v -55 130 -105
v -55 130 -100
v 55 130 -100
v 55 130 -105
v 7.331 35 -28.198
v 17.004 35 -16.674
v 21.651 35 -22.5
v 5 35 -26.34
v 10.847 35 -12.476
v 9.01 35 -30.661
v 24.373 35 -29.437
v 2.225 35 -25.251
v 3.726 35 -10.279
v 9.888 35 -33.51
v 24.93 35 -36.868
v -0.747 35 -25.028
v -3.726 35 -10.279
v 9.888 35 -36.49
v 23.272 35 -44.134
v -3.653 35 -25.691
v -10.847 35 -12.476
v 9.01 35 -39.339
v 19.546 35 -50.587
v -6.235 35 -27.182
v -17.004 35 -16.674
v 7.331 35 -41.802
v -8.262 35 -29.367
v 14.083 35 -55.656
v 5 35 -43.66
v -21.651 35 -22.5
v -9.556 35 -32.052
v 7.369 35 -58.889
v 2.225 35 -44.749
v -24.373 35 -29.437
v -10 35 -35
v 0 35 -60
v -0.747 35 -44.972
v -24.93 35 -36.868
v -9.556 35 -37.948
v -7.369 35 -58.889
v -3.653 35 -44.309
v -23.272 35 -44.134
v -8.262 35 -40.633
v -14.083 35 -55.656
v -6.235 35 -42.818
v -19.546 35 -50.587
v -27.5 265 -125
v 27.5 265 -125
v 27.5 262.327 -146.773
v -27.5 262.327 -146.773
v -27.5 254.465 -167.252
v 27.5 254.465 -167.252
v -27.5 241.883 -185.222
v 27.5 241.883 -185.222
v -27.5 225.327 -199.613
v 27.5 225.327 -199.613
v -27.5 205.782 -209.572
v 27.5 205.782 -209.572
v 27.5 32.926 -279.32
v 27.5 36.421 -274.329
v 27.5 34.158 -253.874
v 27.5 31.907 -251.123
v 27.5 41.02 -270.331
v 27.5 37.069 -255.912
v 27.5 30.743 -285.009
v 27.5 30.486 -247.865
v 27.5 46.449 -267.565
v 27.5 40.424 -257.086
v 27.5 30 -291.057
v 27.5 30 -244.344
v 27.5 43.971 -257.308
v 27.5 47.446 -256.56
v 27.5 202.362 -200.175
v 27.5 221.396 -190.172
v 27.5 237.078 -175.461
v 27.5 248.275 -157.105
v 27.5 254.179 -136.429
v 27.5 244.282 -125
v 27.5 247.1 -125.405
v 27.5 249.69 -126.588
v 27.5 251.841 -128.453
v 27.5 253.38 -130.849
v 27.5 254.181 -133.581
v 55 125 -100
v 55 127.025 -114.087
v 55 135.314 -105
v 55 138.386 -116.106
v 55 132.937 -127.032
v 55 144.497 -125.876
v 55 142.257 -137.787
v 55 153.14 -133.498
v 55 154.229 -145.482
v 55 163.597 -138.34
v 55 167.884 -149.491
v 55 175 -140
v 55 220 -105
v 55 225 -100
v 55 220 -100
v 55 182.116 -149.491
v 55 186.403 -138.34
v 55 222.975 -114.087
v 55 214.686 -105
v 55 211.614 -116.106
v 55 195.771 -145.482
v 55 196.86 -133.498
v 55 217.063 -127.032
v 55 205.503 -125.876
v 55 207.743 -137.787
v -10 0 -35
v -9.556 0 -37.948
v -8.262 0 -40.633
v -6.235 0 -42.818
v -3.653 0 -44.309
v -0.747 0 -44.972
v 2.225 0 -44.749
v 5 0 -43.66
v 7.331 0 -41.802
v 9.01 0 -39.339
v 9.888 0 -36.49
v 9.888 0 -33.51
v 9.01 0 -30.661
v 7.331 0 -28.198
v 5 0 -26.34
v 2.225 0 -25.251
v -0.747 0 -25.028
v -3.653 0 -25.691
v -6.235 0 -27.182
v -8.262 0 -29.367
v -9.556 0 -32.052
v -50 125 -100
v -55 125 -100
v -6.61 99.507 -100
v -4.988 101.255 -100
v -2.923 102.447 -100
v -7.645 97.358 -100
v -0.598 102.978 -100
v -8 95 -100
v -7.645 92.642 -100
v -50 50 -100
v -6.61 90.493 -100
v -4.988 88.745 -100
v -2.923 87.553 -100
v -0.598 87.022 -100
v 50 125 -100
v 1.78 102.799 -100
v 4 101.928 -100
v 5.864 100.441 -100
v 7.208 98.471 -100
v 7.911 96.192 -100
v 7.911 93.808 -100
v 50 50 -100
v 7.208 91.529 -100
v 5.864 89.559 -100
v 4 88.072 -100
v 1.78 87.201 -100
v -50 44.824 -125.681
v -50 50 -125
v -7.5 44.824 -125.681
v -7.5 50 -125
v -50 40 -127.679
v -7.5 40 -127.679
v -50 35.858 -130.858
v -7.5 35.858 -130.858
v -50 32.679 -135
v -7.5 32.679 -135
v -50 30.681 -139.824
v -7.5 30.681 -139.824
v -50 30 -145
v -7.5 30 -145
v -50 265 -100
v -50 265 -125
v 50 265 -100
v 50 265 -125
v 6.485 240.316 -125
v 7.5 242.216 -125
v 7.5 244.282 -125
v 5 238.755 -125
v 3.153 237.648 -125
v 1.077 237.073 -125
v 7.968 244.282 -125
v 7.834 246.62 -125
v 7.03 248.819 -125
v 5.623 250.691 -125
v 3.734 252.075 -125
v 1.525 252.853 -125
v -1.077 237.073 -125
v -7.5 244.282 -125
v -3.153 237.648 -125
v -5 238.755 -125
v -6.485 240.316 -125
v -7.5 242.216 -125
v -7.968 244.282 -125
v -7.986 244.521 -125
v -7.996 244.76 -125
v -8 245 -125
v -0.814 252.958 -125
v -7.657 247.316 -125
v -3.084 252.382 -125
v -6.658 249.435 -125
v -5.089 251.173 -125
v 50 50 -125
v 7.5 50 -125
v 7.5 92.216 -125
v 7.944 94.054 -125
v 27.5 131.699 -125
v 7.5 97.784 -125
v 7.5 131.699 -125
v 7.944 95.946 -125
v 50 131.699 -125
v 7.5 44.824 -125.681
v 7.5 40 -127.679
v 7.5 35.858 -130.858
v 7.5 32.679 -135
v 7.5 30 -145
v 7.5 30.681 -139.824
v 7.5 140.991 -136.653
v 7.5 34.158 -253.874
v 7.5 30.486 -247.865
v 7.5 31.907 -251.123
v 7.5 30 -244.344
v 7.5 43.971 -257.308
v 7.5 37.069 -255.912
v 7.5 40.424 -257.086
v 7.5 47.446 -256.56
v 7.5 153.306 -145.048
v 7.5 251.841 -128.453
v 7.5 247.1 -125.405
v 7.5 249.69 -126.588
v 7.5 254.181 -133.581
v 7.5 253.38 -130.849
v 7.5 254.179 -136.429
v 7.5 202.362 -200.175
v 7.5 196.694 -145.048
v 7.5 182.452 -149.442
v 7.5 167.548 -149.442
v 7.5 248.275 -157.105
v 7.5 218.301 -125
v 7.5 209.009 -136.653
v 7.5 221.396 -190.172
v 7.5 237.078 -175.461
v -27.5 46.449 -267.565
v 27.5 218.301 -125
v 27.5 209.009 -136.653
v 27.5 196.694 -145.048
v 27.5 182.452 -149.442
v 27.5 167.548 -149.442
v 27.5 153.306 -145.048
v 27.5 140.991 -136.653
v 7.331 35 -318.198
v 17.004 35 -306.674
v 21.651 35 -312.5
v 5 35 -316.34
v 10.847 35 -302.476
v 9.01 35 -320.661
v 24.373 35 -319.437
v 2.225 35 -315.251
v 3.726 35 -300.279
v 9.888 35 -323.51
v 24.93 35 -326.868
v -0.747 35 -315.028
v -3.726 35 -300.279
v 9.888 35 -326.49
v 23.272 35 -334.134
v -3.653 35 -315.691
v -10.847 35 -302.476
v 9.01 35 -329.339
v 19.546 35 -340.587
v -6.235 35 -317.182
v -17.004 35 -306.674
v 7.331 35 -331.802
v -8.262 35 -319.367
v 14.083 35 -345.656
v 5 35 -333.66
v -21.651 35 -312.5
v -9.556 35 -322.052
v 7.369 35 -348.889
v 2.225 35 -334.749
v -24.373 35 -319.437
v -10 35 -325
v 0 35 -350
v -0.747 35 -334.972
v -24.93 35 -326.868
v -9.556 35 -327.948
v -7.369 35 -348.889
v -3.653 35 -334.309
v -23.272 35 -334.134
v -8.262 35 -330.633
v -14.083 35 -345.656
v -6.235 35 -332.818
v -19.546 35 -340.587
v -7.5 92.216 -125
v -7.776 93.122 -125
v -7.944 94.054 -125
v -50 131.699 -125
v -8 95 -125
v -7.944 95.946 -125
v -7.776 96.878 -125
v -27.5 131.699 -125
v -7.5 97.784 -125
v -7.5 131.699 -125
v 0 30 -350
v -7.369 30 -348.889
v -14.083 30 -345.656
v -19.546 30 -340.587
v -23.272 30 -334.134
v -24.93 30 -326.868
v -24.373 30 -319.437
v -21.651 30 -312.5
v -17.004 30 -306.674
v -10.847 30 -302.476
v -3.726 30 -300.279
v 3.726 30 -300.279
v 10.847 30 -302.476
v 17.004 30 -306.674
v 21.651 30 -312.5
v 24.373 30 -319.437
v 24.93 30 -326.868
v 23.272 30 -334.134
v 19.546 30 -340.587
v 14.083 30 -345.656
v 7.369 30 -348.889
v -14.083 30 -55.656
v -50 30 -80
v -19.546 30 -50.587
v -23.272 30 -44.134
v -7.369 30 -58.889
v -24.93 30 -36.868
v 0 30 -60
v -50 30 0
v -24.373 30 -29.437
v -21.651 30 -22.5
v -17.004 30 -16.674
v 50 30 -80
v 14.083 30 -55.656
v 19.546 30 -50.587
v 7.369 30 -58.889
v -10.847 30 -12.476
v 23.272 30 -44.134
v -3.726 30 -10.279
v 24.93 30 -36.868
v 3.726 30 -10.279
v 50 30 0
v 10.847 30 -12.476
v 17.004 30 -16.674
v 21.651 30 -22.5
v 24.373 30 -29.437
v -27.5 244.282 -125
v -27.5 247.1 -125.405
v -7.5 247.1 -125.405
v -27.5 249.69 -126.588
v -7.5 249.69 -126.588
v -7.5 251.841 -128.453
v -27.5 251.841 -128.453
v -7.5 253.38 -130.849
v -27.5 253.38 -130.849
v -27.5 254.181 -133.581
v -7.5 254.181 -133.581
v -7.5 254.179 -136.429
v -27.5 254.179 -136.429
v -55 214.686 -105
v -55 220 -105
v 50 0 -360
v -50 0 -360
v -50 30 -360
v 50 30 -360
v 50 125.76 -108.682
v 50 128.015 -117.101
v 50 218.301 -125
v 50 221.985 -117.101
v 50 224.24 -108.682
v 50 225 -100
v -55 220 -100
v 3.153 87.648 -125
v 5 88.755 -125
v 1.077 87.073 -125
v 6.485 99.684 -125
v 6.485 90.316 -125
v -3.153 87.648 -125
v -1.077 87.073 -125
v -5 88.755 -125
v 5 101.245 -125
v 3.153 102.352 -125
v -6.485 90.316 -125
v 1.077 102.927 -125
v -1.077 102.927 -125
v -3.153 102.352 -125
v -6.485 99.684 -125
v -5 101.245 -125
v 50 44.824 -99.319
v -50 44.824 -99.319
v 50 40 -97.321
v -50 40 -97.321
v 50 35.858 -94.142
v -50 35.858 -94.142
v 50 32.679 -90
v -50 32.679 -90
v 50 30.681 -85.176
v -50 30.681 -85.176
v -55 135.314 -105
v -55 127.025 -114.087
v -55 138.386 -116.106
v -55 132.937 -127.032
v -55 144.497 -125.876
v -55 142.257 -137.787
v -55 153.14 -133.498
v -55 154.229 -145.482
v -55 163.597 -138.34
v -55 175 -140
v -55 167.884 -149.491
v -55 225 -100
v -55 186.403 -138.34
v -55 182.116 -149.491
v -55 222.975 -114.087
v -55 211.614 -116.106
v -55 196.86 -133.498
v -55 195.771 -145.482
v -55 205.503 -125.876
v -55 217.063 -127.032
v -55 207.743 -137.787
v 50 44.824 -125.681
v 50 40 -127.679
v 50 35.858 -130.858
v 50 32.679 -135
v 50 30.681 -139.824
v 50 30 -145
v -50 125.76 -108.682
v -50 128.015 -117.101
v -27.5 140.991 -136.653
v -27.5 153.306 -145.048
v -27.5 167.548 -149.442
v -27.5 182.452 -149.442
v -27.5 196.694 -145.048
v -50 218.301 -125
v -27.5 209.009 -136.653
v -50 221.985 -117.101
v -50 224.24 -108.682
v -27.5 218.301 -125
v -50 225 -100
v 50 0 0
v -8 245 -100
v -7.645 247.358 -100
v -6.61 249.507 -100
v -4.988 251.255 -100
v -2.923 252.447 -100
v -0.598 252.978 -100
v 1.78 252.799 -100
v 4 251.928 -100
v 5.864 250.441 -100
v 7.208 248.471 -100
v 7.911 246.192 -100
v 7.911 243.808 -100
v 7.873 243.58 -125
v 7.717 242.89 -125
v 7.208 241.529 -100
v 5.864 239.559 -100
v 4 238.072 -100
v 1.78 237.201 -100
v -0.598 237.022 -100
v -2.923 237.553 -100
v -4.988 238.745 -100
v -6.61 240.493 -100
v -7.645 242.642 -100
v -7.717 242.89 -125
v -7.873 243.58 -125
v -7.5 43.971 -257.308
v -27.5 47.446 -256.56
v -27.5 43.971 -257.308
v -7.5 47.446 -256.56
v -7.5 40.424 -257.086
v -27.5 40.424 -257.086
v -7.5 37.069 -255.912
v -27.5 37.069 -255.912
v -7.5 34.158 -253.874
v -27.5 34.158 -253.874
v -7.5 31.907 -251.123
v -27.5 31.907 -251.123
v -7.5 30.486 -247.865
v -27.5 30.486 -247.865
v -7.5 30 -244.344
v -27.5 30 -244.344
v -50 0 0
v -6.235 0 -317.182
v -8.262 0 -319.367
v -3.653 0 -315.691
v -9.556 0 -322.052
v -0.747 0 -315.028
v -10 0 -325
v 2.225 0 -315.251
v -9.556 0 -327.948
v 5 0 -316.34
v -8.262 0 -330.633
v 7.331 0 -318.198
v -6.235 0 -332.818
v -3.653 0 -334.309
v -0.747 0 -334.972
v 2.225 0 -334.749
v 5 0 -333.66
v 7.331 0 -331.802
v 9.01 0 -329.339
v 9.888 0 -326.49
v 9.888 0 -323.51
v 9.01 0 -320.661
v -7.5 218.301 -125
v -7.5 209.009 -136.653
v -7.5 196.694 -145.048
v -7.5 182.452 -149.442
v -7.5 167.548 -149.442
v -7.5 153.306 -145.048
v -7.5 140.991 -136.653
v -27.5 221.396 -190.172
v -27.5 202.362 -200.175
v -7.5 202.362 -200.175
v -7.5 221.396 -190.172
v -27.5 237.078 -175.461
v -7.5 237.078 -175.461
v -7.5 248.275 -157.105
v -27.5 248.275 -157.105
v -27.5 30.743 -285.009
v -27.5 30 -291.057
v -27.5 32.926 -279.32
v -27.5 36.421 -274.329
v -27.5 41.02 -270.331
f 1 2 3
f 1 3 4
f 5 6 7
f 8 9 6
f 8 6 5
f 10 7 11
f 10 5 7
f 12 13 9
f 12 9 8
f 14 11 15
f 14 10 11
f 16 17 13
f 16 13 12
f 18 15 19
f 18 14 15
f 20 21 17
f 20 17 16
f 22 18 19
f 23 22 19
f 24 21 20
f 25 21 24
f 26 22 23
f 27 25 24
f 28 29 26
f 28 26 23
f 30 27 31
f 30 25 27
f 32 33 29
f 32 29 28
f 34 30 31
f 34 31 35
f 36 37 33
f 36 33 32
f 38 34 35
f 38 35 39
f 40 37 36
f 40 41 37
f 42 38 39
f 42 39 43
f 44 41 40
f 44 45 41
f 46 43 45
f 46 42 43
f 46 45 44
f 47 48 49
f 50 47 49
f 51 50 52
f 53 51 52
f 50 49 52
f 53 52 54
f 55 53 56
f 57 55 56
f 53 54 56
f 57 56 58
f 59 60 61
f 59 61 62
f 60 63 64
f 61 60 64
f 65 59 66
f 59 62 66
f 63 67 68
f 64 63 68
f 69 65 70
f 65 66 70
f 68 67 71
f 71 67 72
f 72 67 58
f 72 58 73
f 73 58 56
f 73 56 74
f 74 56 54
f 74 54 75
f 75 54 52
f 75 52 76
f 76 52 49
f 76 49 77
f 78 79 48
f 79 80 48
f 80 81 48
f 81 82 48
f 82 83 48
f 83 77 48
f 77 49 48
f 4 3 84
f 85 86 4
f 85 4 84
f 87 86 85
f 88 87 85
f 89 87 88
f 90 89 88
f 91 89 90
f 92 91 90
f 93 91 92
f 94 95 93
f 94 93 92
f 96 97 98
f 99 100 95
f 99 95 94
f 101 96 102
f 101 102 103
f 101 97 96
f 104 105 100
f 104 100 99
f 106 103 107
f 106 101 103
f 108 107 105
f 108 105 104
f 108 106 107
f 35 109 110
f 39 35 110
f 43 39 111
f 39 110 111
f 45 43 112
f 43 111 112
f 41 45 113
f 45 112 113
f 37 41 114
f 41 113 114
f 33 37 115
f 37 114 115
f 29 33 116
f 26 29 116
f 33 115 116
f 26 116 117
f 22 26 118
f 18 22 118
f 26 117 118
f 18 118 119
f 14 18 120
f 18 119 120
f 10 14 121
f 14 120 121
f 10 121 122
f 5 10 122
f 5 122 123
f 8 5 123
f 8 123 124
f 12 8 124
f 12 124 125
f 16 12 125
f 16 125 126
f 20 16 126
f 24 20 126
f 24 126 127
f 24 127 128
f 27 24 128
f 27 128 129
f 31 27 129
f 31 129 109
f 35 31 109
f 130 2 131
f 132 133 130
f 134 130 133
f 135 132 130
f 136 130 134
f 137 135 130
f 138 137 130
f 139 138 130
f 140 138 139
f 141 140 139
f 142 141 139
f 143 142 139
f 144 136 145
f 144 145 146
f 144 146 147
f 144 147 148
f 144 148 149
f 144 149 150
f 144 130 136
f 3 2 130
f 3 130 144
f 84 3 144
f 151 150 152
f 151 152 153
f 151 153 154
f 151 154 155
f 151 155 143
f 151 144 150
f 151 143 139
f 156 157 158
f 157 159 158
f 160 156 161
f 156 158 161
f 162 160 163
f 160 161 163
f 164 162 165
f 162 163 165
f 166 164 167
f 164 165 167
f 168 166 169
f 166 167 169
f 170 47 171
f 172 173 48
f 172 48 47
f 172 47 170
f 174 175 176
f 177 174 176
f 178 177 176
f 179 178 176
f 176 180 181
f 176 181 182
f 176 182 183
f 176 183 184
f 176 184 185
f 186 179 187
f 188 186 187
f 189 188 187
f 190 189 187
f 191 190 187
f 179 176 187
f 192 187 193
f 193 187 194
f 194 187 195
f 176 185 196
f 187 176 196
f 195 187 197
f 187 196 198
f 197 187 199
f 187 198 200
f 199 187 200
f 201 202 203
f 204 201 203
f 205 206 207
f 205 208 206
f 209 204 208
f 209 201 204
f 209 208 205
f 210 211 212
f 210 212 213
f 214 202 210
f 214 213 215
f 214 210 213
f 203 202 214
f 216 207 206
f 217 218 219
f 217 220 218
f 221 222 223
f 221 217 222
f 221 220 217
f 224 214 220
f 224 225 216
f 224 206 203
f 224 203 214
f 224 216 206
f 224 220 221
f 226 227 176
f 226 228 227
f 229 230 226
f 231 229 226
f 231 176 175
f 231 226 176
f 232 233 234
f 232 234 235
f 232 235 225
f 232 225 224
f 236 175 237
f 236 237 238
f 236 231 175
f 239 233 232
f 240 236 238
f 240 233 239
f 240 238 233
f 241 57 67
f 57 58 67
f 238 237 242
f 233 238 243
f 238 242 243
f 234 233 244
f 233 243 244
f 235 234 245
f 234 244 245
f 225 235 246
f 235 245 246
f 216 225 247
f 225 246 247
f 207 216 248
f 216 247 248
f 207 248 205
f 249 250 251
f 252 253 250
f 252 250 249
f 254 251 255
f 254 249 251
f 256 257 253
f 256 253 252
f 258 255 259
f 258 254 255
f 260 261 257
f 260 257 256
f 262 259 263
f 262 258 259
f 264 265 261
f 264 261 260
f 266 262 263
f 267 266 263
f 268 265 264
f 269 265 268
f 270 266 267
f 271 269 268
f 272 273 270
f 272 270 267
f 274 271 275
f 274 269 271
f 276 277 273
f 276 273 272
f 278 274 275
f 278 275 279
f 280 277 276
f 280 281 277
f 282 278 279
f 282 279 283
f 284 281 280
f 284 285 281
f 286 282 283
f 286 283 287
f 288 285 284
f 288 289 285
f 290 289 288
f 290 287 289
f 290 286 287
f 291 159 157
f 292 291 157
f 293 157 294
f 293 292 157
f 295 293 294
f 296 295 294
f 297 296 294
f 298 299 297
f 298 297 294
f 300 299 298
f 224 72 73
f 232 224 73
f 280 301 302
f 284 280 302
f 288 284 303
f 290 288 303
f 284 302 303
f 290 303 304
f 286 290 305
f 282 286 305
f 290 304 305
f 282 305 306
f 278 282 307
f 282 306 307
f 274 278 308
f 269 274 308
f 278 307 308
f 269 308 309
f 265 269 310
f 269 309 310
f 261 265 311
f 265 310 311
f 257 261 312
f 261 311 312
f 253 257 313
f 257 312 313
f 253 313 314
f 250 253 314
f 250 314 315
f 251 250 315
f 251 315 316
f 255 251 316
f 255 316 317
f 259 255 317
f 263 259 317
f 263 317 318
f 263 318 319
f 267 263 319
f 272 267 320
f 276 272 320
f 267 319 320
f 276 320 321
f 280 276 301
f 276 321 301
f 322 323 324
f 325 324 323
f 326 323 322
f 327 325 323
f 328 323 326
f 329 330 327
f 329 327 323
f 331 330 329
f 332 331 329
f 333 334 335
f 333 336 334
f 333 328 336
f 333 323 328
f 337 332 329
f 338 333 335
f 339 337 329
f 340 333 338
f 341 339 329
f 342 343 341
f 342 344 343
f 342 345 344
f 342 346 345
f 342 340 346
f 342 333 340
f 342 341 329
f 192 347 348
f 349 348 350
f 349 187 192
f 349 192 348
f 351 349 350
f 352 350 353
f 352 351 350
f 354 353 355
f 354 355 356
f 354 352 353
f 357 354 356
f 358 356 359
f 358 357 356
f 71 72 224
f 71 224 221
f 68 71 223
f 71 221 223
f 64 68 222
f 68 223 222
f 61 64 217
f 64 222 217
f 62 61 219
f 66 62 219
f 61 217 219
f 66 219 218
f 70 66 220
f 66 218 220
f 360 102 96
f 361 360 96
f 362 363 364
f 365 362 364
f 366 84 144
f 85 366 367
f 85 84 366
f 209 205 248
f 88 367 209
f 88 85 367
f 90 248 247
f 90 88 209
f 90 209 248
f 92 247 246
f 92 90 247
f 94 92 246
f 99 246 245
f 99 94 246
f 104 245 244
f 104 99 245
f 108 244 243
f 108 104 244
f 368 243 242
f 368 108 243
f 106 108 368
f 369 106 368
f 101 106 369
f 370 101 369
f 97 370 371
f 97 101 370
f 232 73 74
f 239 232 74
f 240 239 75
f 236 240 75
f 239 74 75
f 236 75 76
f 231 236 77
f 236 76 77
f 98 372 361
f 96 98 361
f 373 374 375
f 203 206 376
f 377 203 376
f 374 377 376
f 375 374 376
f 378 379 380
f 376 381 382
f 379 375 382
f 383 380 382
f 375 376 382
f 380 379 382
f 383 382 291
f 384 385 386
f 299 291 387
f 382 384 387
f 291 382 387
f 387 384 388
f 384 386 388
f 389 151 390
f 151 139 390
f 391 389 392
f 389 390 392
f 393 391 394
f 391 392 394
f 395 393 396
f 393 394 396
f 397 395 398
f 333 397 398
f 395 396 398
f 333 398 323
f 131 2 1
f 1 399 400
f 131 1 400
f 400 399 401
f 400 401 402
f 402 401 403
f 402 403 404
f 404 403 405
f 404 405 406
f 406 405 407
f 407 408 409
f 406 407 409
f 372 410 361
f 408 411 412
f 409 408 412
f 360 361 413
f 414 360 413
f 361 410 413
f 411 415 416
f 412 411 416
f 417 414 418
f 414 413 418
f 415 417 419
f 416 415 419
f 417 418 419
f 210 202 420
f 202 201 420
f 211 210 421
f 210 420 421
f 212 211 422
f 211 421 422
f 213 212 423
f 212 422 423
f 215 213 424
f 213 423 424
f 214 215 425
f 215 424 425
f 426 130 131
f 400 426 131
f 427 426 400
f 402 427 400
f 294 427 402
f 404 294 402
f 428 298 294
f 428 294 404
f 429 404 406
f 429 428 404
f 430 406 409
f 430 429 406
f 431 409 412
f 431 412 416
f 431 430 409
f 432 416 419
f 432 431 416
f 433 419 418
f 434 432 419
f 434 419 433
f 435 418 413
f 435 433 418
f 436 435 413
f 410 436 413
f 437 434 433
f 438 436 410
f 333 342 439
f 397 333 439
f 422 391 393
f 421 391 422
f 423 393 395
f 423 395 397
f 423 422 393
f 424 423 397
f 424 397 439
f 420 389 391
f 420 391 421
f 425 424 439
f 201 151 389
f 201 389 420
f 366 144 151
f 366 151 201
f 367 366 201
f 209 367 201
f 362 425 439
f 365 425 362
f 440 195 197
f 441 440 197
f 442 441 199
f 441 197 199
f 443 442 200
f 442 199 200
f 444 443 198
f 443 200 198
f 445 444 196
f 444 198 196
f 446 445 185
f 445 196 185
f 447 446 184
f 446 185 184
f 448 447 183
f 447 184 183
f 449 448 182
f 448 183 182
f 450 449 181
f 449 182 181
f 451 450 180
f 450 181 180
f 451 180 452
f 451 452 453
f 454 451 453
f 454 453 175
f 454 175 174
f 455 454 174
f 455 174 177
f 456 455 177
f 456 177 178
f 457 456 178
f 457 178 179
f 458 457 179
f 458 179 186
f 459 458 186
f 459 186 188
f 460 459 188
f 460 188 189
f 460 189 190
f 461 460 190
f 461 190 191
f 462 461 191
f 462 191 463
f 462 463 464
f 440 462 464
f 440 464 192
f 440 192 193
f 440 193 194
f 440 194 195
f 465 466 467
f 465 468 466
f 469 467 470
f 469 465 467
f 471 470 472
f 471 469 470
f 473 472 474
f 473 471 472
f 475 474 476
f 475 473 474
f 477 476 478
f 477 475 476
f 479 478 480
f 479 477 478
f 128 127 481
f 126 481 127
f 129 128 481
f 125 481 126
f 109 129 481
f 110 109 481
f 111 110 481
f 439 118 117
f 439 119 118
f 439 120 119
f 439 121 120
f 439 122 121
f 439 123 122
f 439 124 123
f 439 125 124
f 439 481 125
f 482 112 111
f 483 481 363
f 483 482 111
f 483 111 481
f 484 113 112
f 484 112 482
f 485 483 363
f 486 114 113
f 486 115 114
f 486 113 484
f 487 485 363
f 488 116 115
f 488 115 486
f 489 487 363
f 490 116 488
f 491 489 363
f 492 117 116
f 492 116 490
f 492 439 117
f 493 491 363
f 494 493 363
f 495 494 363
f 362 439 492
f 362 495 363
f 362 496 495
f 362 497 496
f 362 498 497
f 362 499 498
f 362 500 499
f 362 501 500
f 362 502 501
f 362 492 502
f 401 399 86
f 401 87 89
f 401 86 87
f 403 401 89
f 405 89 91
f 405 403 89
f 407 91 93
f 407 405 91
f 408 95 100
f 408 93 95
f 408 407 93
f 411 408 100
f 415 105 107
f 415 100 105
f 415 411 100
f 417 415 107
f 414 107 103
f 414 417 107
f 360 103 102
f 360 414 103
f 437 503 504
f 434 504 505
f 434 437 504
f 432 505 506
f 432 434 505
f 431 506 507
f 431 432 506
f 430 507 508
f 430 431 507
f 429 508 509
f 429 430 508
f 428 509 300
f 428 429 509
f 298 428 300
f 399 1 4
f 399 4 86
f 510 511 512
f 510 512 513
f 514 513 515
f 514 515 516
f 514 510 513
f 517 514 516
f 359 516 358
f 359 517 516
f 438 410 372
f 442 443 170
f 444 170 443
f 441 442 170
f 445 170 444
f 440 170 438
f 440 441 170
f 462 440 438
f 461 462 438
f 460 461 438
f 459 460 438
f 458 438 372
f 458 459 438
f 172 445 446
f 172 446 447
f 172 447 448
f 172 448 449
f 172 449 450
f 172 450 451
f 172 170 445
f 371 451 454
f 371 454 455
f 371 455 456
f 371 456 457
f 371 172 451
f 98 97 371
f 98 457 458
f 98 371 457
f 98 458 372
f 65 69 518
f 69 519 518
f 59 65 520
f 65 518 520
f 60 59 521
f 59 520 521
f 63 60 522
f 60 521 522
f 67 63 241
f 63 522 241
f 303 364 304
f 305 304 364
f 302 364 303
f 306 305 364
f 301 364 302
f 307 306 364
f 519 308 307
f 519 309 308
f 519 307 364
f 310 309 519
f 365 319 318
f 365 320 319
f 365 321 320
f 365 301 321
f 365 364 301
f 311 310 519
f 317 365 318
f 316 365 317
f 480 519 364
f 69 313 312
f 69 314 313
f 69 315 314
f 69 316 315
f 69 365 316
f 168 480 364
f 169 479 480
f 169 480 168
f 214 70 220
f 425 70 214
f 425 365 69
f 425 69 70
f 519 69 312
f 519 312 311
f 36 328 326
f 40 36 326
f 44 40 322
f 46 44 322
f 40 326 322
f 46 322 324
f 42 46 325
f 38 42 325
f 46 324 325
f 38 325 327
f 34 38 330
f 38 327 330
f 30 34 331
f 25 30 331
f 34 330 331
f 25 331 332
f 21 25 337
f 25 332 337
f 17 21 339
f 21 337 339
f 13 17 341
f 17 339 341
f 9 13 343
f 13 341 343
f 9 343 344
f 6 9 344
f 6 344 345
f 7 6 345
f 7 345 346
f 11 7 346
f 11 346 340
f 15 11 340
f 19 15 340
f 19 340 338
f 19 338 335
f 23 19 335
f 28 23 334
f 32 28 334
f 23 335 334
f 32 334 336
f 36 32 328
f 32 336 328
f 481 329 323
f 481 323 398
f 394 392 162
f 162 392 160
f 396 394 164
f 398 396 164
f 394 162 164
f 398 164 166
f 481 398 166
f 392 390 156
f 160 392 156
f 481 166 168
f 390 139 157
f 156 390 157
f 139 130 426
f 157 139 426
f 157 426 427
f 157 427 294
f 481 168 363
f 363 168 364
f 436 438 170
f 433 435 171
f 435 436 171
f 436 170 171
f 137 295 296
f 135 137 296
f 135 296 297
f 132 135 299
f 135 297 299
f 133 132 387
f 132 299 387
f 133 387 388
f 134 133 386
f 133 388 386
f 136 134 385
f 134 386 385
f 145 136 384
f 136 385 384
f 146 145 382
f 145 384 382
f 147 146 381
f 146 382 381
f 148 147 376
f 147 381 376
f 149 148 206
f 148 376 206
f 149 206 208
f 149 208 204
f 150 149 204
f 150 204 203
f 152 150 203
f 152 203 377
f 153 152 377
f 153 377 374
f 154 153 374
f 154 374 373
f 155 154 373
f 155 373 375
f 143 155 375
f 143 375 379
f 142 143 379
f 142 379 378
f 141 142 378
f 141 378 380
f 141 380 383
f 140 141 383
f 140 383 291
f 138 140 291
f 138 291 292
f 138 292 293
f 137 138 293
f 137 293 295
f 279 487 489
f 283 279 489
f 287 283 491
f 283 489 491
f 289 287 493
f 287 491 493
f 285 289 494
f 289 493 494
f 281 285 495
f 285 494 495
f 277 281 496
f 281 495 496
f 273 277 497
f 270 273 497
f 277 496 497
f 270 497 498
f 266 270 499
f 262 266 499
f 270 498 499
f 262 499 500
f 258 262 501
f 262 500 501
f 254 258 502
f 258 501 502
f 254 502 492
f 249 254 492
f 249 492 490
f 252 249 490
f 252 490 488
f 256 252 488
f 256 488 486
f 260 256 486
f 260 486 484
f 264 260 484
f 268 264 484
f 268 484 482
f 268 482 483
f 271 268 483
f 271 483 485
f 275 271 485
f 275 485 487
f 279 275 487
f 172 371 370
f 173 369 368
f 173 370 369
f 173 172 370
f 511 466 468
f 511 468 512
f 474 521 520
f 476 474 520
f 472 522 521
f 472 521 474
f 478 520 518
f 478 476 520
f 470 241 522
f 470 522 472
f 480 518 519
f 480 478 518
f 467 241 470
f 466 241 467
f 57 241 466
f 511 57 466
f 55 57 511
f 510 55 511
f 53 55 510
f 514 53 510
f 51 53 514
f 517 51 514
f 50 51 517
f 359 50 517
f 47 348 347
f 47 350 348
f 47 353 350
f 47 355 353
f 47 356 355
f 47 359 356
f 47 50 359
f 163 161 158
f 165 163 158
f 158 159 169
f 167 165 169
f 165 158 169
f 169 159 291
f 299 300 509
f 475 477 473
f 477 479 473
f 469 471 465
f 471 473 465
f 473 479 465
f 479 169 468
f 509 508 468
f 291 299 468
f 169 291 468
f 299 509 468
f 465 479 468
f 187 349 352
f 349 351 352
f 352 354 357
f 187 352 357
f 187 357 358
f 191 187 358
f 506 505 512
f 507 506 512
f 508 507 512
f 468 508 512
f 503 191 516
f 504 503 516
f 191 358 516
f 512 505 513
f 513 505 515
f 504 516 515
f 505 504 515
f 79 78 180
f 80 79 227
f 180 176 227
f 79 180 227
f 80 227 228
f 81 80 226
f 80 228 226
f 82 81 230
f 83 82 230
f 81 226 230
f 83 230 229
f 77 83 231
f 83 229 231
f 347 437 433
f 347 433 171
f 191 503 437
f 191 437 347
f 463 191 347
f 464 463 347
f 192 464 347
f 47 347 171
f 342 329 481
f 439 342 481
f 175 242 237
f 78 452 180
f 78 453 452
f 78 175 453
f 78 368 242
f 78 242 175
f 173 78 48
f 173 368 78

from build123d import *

# Parameters (mm, degrees)
BOSS_EXTRUDE1_DEPTH     = 50
BOSS_EXTRUDE4_DEPTH     = 55
BOSS_EXTRUDE5_DEPTH     = 27.5
CUT_EXTRUDE1_DEPTH      = 20
FILLET1_R               = 13
FILLET2_R               = 25
FILLET3_R               = 10
FILLET4_R               = 20
CUT_EXTRUDE2_DEPTH      = 461.353125329
CUT_EXTRUDE2_DEPTH_BACK = 461.353125329
CUT_EXTRUDE3_START      = -110
SKETCH14_W              = 10
SKETCH14_H              = 90
CUT_EXTRUDE3_DEPTH      = 110
SKETCH15_R              = 25
BOSS_EXTRUDE6_DEPTH     = 5
LPATTERN1_COUNT         = 2
LPATTERN1_PITCH         = 290
HOLE1_D                 = 20
HOLE2_D                 = 16
HOLE2_DEPTH             = 25
LPATTERN2_COUNT         = 2
LPATTERN2_PITCH         = 150


with BuildPart() as part:
    # Sketch2 → Boss-Extrude1 (new, symmetric)
    with BuildSketch(Plane(origin=(0, 0, 0), x_dir=(0, 0, -1), z_dir=(1, 0, 0))):
        Polygon((0, 0), (360, 0), (360, 30), (125, 30), (125, 265), (100, 265), (100, 30), (0, 30), align=None)
    extrude(amount=BOSS_EXTRUDE1_DEPTH, both=True)

    # Sketch7 → Boss-Extrude4 (add, symmetric)
    with BuildSketch(Plane(origin=(0, 0, 0), x_dir=(0, 0, -1), z_dir=(1, 0, 0))):
        with BuildLine():
            Line((100, 225), (100, 125))
            ThreePointArc((100, 125), (150, 175), (100, 225))
        make_face()
    extrude(amount=BOSS_EXTRUDE4_DEPTH, both=True)

    # Sketch11 → Boss-Extrude5 (add, symmetric)
    with BuildSketch(Plane(origin=(0, 0, 0), x_dir=(0, 0, -1), z_dir=(1, 0, 0))):
        with BuildLine():
            Line((209.572335871, 205.781812899), (273.551683491, 30))
            Line((273.551683491, 30), (125, 30))
            Line((125, 30), (125, 265))
            ThreePointArc((125, 265), (176.621879272, 248.723683986), (209.572335871, 205.781812899))
        make_face()
    extrude(amount=BOSS_EXTRUDE5_DEPTH, both=True)

    # Sketch12 → Cut-Extrude1 (cut)
    with BuildSketch(Plane(origin=(27.5, 0, 0), x_dir=(0, 0, -1), z_dir=(1, 0, 0))):
        with BuildLine():
            Line((125, 255), (125, 218.301270189))
            ThreePointArc((125, 218.301270189), (150, 175), (125, 131.698729811))
            Line((125, 131.698729811), (125, 30))
            Line((125, 30), (262.909905767, 30))
            Line((262.909905767, 30), (200.175409663, 202.361611466))
            ThreePointArc((200.175409663, 202.361611466), (170.886114908, 240.532163543), (125, 255))
        make_face()
    cut_extrude1 = extrude(amount=-CUT_EXTRUDE1_DEPTH, mode=Mode.SUBTRACT)

    # Mirror1: Cut-Extrude1 across plane
    add(cut_extrude1.mirror(Plane(origin=(0, 0, 0), x_dir=(0, 0, 1), z_dir=(1, 0, 0))), mode=Mode.SUBTRACT)

    # Fillet1
    fillet1_edges = [part.edges().sort_by_distance(p)[0] for p in [
        (17.5, 30, -262.909905767),
        (-17.5, 30, -262.909905767),
    ]]
    fillet(fillet1_edges, radius=FILLET1_R)

    # Fillet2
    fillet2_edges = [part.edges().sort_by_distance(p)[0] for p in [
        (0, 30, -273.551683491),
    ]]
    fillet(fillet2_edges, radius=FILLET2_R)

    # Fillet3
    fillet3_edges = [part.edges().sort_by_distance(p)[0] for p in [
        (17.5, 255, -125),
        (-17.5, 255, -125),
    ]]
    fillet(fillet3_edges, radius=FILLET3_R)

    # Fillet4
    fillet4_edges = [part.edges().sort_by_distance(p)[0] for p in [
        (0, 30, -100),
        (28.75, 30, -125),
        (-28.75, 30, -125),
    ]]
    fillet(fillet4_edges, radius=FILLET4_R)

    # Sketch13 → Cut-Extrude2 (cut, two sides: drawn at the far end of the back side and taken through both)
    with BuildSketch(Plane(origin=(55, 0, 0), x_dir=(0, 0, -1), z_dir=(1, 0, 0)).offset(-CUT_EXTRUDE2_DEPTH_BACK)):
        with BuildLine():
            Line((100, 215), (100, 135))
            ThreePointArc((100, 135), (140, 175), (100, 215))
        make_face()
    extrude(amount=CUT_EXTRUDE2_DEPTH + CUT_EXTRUDE2_DEPTH_BACK, mode=Mode.SUBTRACT)

    # Sketch14 → Cut-Extrude3 (cut)
    with BuildSketch(Plane(origin=(55, 0, 0), x_dir=(0, 0, -1), z_dir=(1, 0, 0)).offset(CUT_EXTRUDE3_START)):
        with Locations((100, 175)):
            Rectangle(SKETCH14_W, SKETCH14_H)
    extrude(amount=CUT_EXTRUDE3_DEPTH, mode=Mode.SUBTRACT)

    # Sketch15 → Boss-Extrude6 (add)
    with BuildSketch(Plane(origin=(0, 30, 0), x_dir=(1, 0, 0), z_dir=(0, 1, 0))):
        with Locations(Location((0, 35, 0), (0, 0, 90))):
            Circle(SKETCH15_R)
    boss_extrude6 = extrude(amount=BOSS_EXTRUDE6_DEPTH)

    # LPattern1: Boss-Extrude6 ×2
    with Locations(*[(0, 0, -i * LPATTERN1_PITCH) for i in range(1, LPATTERN1_COUNT)]):
        add(boss_extrude6)

    # Hole1 (through all)
    with Locations(Plane(origin=(0, 35, 0), x_dir=(1, 0, 0), z_dir=(0, 1, 0))):
        with Locations((0, 35), (0, 325)):
            Hole(HOLE1_D / 2)

    # Hole2
    with Locations(Plane.XY.offset(-100)):
        with Locations((0, 245)):
            hole2 = Hole(HOLE2_D / 2, depth=HOLE2_DEPTH)

    # LPattern2: Hole2 ×2
    with Locations(*[(0, -i * LPATTERN2_PITCH, 0) for i in range(1, LPATTERN2_COUNT)]):
        add(hole2, mode=Mode.SUBTRACT)


solid = part.part
